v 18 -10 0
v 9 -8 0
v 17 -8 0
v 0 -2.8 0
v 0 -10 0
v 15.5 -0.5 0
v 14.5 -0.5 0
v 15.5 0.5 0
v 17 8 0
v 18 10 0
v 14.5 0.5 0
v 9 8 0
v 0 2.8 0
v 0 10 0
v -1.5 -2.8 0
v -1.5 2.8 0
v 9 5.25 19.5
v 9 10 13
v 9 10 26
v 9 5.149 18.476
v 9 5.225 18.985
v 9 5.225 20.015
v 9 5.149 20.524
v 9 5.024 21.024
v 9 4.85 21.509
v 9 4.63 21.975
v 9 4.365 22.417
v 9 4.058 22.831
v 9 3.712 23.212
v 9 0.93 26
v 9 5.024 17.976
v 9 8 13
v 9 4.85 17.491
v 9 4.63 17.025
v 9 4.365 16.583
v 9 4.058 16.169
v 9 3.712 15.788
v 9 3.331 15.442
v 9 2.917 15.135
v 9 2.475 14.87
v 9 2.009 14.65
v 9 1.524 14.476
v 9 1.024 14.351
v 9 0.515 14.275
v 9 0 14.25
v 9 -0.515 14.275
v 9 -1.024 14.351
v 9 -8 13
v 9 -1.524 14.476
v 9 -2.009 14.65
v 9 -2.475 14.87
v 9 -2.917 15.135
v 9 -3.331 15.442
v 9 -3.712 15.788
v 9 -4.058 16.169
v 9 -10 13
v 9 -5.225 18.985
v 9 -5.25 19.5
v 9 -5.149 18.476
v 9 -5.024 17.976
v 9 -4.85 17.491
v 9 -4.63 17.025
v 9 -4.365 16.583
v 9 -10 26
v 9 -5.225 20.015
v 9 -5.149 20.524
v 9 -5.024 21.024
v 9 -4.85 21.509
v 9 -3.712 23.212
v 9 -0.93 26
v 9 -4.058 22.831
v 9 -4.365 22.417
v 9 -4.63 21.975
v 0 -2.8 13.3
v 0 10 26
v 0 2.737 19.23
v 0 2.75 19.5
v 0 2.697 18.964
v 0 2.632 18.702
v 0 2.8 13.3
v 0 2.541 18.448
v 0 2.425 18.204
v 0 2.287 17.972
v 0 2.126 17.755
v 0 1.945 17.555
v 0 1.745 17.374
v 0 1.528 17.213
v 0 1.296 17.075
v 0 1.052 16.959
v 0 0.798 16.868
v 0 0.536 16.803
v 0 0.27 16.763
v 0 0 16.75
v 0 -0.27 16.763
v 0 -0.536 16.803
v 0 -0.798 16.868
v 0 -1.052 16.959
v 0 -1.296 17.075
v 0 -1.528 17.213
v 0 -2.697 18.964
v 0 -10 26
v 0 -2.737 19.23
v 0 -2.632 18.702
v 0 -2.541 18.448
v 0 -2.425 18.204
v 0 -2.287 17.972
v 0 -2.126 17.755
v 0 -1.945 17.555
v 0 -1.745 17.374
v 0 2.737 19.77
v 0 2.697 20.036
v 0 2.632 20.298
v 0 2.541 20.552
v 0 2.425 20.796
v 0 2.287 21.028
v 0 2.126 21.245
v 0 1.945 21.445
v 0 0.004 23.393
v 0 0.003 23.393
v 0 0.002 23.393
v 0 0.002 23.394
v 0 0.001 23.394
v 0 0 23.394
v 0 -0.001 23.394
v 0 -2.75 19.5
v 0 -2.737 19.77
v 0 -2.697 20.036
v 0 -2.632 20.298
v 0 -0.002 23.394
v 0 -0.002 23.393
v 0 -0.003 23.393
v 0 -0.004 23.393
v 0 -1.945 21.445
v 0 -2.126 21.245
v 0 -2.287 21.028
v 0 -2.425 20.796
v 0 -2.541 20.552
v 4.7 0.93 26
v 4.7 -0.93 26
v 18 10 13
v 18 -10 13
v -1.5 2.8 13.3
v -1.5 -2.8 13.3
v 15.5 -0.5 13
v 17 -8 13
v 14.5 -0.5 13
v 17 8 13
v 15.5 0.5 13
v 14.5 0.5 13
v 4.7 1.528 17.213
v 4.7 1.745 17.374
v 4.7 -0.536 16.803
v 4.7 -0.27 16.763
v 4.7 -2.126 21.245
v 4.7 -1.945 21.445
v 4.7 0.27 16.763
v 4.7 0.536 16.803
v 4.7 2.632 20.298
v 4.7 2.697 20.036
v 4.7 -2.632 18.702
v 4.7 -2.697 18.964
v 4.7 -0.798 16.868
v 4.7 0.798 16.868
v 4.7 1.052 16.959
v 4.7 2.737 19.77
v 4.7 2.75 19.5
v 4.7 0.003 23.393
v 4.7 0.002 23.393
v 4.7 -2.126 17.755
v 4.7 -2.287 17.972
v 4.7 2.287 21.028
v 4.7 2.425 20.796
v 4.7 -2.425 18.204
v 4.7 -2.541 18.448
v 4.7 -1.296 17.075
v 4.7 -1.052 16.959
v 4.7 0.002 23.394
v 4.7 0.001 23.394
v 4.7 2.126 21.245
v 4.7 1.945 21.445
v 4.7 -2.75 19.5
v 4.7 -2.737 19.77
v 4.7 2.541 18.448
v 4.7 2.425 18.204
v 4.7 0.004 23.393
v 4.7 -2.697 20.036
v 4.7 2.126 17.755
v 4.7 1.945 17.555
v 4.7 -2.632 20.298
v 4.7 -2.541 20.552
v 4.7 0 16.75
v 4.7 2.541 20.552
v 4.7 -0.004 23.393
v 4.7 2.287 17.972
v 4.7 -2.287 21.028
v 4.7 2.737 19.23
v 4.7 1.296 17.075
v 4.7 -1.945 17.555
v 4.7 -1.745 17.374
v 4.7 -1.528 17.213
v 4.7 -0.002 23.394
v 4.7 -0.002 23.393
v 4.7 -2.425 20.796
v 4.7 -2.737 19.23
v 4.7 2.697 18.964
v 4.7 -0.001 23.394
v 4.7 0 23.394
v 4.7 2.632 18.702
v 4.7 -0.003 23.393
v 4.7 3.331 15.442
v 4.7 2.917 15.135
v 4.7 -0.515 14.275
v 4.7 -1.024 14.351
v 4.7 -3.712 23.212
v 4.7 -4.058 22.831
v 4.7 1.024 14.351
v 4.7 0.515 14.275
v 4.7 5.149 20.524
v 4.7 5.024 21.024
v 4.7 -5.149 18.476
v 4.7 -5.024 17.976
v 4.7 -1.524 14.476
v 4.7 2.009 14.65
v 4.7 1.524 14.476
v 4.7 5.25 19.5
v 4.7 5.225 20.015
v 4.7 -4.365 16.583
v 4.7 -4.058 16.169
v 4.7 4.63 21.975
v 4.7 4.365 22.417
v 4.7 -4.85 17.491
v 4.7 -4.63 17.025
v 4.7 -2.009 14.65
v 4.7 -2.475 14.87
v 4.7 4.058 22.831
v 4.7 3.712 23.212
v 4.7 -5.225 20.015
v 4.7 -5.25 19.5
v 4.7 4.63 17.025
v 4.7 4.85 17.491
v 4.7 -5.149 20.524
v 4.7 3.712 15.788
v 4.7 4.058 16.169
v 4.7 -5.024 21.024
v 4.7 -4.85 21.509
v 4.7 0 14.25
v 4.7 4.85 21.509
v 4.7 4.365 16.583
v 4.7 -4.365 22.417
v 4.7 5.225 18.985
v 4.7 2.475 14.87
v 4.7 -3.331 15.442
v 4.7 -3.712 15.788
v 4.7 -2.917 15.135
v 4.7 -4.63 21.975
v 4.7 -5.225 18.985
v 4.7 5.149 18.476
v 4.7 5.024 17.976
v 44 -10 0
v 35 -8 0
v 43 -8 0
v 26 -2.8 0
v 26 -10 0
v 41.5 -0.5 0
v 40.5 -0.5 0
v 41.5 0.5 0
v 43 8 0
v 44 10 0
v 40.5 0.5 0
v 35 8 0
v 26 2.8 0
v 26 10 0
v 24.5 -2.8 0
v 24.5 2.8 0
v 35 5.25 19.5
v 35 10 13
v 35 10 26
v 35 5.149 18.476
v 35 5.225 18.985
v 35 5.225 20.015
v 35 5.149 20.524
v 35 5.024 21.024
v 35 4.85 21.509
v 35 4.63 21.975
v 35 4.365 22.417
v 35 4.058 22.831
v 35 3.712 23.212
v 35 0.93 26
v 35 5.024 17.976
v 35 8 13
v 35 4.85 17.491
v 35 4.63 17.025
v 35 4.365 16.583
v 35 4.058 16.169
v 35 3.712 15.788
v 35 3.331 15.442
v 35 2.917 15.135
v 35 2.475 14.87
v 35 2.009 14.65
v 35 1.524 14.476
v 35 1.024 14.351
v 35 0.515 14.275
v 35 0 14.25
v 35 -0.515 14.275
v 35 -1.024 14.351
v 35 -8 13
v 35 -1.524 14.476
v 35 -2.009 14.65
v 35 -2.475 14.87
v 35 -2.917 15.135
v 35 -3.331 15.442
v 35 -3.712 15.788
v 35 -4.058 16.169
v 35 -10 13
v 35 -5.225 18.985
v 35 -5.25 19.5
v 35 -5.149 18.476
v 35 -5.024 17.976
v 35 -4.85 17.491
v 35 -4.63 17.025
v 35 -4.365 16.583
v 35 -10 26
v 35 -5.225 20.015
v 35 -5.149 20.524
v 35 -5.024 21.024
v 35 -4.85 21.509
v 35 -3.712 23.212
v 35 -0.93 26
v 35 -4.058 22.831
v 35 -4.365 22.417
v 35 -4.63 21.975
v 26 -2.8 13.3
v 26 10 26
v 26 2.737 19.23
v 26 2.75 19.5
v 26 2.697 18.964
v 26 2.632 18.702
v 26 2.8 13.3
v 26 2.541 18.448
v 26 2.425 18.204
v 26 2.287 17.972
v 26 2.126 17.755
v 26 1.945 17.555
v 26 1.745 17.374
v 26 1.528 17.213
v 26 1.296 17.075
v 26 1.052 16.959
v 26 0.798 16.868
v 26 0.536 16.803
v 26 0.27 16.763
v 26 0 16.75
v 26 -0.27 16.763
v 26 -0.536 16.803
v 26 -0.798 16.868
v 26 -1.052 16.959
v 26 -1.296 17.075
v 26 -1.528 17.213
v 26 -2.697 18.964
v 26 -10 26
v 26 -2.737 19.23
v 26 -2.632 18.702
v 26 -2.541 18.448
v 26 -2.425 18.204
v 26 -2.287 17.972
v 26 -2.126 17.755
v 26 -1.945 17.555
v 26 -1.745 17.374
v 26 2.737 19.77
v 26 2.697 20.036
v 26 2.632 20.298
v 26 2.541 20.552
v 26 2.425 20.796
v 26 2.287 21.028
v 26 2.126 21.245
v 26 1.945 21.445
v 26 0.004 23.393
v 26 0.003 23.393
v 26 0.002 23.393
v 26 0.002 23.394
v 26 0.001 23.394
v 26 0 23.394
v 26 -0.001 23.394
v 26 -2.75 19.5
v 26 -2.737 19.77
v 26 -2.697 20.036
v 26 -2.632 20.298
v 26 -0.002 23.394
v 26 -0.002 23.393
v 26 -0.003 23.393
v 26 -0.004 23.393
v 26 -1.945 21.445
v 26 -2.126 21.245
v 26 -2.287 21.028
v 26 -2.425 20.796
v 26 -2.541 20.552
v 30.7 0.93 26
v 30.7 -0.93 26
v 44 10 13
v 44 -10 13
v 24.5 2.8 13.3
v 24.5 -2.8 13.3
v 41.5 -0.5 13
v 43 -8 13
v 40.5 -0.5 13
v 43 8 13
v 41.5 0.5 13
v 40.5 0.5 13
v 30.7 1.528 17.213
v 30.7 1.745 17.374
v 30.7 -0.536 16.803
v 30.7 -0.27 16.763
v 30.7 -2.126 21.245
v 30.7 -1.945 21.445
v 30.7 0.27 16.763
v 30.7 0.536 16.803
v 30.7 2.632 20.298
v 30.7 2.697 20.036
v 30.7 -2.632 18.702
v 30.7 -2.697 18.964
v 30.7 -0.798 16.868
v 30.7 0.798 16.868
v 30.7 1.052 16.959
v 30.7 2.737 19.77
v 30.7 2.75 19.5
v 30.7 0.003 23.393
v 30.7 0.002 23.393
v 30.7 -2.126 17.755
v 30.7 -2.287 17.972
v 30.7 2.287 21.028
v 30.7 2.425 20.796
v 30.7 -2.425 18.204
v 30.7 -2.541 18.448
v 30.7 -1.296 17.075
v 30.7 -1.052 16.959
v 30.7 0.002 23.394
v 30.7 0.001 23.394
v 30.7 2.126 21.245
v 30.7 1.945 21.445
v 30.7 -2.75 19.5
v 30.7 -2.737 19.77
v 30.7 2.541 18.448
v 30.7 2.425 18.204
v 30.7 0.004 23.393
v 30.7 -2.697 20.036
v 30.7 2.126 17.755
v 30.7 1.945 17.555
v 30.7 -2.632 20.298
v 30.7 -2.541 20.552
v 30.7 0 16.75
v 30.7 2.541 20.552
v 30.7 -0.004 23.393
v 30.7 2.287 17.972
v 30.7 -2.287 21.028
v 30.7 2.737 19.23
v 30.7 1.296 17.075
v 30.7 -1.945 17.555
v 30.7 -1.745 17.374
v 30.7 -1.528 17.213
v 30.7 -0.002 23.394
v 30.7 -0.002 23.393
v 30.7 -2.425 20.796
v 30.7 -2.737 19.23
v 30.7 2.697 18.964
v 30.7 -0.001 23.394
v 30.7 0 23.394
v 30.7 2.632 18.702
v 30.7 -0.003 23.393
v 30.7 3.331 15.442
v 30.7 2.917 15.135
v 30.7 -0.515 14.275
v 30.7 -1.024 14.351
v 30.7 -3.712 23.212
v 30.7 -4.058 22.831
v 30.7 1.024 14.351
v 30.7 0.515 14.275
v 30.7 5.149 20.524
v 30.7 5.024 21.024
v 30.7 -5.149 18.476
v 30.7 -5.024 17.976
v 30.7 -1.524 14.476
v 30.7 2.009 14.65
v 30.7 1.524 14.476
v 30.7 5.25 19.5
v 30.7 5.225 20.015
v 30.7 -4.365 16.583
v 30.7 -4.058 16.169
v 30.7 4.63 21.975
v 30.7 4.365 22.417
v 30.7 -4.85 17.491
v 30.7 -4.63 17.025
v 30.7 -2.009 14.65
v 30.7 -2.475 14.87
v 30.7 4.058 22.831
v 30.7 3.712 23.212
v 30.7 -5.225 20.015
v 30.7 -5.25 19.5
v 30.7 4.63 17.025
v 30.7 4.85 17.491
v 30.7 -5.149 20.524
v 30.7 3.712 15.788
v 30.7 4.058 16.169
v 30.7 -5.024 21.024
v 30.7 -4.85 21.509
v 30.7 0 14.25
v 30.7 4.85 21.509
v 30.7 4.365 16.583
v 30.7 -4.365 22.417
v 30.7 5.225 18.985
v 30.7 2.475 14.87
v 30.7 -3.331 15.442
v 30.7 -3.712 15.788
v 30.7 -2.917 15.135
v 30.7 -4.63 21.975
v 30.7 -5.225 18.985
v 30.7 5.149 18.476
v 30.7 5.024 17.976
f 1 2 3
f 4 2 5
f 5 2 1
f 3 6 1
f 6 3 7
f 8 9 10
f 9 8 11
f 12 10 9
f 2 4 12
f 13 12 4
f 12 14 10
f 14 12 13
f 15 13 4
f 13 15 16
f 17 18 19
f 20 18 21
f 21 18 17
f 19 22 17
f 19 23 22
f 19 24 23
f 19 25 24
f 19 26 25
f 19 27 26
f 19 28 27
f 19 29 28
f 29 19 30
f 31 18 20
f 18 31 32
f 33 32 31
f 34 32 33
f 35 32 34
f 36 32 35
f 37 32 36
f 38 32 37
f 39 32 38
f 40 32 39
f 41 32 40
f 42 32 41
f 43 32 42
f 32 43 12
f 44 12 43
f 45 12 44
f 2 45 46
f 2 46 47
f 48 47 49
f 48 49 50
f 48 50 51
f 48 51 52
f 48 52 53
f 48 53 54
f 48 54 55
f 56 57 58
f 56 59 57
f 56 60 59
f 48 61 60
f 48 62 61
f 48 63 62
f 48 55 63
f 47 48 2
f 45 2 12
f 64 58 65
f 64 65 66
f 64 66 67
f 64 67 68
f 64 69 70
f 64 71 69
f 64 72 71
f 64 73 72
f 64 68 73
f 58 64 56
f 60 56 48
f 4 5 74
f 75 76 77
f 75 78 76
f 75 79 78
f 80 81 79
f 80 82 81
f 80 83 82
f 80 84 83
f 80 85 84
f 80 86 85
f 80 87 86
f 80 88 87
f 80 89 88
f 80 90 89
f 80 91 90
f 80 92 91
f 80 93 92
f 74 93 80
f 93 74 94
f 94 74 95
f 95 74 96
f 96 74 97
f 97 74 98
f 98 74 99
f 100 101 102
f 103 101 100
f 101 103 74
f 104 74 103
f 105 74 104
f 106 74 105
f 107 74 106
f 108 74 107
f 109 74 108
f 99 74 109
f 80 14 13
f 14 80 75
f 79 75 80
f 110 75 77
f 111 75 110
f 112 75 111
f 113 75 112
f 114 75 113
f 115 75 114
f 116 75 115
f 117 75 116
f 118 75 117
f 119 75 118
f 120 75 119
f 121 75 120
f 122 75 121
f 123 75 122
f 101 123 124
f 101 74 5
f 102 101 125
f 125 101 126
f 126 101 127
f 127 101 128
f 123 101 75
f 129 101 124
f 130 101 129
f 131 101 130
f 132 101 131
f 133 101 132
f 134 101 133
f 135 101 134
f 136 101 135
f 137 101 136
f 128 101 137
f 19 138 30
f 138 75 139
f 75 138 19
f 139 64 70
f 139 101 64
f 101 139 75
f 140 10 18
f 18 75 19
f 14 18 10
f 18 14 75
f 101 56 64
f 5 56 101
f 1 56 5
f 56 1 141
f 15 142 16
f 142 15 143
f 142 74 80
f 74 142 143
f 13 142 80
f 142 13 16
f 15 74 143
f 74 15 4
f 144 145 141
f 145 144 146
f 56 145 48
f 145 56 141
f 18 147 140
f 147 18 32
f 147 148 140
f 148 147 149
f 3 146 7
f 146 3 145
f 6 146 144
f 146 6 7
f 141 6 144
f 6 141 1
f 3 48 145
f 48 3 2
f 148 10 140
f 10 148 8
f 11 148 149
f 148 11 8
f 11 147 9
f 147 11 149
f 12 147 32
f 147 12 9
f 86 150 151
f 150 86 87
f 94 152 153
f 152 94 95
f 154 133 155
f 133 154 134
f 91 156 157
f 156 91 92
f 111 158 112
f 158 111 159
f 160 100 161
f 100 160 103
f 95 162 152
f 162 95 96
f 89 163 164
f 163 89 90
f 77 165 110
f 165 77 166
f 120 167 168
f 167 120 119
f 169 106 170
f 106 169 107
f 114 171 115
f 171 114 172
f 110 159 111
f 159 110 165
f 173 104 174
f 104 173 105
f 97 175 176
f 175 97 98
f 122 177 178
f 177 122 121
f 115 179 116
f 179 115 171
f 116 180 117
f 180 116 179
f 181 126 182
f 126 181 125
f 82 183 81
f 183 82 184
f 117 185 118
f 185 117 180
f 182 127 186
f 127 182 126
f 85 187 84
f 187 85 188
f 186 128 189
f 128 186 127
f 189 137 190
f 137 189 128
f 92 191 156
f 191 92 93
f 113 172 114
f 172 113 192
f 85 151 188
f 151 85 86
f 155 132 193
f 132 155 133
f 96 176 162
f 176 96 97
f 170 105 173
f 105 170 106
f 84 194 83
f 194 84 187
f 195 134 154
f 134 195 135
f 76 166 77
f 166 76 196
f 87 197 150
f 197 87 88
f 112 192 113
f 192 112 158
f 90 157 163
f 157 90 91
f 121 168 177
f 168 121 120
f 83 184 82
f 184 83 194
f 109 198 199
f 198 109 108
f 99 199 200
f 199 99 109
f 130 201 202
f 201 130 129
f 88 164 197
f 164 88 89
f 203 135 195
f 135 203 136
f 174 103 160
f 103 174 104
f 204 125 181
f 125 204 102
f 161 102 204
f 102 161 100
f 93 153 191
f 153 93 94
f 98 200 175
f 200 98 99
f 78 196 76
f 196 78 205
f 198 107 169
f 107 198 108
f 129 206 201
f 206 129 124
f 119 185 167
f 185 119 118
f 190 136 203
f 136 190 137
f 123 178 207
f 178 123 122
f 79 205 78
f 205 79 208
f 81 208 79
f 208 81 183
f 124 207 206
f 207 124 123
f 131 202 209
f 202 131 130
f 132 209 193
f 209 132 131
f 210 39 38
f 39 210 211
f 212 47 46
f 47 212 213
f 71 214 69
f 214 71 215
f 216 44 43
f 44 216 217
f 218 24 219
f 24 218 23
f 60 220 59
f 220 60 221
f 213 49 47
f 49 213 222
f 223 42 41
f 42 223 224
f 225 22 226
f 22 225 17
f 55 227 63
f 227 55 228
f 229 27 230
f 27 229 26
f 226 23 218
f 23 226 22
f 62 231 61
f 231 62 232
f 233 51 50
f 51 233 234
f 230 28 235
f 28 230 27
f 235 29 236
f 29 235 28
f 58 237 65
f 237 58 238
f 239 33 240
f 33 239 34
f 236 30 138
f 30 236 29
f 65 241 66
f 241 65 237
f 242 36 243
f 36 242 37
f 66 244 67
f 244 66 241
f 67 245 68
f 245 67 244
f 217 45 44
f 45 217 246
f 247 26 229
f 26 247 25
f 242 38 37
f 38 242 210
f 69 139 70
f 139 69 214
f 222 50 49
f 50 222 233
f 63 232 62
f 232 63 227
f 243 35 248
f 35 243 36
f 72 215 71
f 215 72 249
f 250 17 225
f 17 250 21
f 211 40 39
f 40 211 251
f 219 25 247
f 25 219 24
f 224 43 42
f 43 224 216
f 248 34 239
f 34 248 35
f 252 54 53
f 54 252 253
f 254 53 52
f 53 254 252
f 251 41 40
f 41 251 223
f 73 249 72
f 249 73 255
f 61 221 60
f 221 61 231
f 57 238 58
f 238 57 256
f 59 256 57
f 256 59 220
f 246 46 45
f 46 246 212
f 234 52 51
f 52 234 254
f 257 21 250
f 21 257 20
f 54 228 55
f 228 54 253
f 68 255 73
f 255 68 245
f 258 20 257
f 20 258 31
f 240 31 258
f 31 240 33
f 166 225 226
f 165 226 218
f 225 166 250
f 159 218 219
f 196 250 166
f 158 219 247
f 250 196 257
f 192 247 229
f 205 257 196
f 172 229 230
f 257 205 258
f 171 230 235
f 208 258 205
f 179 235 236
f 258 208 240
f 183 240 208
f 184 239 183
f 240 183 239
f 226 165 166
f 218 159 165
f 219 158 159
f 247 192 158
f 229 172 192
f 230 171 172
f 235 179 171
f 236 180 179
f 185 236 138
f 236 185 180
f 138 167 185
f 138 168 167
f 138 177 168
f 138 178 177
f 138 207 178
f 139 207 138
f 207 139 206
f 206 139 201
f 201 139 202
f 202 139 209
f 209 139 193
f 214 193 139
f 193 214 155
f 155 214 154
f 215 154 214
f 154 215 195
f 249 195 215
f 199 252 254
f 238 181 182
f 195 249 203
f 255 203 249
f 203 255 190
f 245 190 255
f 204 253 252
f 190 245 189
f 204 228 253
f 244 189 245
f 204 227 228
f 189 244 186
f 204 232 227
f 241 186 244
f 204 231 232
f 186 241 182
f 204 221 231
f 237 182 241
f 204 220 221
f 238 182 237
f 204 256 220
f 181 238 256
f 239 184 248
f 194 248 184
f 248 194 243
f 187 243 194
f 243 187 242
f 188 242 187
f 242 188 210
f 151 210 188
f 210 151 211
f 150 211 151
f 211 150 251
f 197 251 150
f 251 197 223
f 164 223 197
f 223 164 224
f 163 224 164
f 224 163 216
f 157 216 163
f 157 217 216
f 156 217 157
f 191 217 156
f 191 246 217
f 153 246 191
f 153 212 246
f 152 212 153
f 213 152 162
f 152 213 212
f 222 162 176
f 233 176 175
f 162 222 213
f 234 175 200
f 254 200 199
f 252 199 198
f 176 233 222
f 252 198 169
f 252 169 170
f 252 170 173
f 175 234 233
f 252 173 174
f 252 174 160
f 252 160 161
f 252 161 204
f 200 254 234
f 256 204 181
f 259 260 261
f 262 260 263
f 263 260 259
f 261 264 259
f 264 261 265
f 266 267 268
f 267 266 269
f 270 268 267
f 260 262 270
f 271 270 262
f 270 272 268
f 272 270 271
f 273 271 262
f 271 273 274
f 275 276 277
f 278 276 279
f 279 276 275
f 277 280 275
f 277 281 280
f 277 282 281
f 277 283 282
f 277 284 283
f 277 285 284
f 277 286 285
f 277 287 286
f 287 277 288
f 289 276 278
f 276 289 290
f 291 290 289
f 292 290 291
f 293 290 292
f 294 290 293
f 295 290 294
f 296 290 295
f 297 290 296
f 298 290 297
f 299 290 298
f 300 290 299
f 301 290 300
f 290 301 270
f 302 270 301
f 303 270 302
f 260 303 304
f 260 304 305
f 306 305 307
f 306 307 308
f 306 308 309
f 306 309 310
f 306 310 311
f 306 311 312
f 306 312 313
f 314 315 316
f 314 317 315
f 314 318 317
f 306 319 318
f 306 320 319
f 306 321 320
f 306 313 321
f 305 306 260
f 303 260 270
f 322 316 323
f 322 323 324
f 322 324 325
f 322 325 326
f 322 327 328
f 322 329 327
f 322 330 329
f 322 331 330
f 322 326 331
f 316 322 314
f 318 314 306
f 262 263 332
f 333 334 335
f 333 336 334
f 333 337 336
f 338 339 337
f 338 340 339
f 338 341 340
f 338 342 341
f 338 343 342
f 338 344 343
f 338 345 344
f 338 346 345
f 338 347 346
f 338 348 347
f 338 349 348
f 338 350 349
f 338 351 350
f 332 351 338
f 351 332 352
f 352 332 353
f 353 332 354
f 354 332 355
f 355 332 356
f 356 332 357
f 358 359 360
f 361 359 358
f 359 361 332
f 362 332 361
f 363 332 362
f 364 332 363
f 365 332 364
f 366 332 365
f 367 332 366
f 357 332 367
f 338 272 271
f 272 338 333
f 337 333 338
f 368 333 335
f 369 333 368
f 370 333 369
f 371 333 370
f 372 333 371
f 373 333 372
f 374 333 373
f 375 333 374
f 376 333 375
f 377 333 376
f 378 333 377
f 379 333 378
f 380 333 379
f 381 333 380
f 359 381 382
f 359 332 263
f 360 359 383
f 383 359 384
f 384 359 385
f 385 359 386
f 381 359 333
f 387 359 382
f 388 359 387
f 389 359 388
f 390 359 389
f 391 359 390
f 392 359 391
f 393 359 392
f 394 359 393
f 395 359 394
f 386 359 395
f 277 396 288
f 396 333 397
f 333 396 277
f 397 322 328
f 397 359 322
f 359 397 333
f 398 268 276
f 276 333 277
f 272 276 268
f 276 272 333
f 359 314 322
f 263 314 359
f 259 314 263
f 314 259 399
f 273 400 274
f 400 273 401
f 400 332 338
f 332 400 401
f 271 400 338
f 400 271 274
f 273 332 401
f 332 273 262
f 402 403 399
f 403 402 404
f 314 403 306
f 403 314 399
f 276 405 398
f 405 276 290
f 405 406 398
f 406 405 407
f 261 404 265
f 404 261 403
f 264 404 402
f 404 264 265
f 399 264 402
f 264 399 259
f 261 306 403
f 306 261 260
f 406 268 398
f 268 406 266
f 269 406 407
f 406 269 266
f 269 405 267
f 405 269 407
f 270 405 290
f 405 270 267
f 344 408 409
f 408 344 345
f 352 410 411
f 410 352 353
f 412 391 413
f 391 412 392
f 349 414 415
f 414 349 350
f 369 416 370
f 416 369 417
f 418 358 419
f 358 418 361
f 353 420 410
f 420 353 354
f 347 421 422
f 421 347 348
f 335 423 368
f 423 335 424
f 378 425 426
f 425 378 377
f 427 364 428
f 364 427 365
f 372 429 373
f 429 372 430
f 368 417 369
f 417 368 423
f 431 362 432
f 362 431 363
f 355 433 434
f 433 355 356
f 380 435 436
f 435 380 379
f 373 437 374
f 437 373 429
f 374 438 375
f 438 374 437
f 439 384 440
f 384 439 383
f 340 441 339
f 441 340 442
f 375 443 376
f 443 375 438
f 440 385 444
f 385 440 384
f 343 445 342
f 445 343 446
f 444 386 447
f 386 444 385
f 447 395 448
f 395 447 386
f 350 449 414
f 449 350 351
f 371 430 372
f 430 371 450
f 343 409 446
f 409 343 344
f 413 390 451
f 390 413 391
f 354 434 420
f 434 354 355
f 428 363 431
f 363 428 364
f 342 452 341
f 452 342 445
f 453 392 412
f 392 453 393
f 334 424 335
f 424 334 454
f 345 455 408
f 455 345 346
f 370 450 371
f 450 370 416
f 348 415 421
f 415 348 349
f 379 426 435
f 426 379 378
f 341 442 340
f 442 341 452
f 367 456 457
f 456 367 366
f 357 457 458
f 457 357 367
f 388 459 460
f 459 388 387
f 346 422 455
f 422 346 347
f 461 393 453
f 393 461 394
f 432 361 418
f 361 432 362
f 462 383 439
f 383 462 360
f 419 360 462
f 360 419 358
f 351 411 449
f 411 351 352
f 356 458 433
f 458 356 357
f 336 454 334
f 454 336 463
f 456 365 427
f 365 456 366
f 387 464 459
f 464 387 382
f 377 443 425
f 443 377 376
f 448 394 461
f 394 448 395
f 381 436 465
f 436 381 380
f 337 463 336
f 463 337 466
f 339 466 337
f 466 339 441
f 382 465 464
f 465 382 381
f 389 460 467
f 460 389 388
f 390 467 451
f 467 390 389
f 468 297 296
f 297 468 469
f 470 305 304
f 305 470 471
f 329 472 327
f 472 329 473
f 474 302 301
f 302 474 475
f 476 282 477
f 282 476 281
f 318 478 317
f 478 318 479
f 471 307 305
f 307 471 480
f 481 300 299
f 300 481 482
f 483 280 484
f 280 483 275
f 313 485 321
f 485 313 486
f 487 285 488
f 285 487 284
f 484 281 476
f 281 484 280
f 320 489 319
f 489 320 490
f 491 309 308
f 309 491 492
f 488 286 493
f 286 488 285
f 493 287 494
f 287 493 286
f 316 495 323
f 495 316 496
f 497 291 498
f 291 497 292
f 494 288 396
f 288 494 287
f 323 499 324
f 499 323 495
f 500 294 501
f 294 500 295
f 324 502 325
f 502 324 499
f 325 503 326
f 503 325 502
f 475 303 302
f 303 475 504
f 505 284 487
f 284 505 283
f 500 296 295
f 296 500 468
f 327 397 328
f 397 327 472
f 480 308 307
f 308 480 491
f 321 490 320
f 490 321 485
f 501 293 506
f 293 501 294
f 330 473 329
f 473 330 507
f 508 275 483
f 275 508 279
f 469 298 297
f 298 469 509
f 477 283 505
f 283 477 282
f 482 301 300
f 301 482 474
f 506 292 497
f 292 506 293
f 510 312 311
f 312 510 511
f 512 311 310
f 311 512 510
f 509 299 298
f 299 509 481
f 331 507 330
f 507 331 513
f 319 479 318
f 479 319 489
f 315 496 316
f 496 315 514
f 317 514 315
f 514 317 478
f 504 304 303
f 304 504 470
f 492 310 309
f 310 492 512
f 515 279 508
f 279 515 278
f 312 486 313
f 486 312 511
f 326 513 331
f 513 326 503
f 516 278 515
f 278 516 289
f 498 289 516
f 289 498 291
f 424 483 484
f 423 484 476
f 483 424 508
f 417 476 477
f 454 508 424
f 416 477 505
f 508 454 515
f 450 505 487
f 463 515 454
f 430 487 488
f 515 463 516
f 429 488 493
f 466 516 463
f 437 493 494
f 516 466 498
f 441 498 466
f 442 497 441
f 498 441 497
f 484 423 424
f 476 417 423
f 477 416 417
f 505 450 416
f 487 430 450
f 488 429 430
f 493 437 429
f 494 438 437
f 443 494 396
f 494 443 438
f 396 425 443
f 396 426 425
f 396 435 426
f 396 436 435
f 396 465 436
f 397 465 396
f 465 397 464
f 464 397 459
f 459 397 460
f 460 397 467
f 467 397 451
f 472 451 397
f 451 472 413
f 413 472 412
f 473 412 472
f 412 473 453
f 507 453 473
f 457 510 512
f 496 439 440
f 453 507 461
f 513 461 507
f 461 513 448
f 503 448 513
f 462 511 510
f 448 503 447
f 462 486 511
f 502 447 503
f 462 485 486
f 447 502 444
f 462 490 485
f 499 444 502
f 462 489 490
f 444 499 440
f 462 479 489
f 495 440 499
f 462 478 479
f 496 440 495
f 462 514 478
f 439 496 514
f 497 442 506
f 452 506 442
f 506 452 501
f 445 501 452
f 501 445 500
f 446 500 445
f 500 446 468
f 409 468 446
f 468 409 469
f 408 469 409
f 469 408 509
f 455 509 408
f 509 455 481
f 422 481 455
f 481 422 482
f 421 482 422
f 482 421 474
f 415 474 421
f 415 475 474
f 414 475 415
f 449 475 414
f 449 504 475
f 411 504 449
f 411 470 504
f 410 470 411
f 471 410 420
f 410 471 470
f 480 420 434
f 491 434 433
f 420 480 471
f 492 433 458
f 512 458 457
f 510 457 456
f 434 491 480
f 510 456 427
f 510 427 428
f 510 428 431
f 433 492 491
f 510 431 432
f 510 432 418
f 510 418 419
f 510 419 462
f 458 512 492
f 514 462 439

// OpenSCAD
// Cable clip: bolts into the rail's top slot with an M5x10 and a drop-in nut, and holds the
// servo leads along the rail. Push the leads in from the top, past the two lips.
// Print orientation: standing on its hoop end, as laid out: the lips print in the layer plane,
// so they flex along the layers. No supports. Copies: one per spare M5 nut.
include <params.scad>
include <lib.scad>

copies = 2;     // 20 M5 nuts: 18 for the rig and speaker clamp, 2 spare

for (i = [0 : copies - 1]) translate([i * (clip_w + 6), 0, 0])
    translate([0, 0, clip_len]) rotate([0, 90, 0]) cable_clip();
